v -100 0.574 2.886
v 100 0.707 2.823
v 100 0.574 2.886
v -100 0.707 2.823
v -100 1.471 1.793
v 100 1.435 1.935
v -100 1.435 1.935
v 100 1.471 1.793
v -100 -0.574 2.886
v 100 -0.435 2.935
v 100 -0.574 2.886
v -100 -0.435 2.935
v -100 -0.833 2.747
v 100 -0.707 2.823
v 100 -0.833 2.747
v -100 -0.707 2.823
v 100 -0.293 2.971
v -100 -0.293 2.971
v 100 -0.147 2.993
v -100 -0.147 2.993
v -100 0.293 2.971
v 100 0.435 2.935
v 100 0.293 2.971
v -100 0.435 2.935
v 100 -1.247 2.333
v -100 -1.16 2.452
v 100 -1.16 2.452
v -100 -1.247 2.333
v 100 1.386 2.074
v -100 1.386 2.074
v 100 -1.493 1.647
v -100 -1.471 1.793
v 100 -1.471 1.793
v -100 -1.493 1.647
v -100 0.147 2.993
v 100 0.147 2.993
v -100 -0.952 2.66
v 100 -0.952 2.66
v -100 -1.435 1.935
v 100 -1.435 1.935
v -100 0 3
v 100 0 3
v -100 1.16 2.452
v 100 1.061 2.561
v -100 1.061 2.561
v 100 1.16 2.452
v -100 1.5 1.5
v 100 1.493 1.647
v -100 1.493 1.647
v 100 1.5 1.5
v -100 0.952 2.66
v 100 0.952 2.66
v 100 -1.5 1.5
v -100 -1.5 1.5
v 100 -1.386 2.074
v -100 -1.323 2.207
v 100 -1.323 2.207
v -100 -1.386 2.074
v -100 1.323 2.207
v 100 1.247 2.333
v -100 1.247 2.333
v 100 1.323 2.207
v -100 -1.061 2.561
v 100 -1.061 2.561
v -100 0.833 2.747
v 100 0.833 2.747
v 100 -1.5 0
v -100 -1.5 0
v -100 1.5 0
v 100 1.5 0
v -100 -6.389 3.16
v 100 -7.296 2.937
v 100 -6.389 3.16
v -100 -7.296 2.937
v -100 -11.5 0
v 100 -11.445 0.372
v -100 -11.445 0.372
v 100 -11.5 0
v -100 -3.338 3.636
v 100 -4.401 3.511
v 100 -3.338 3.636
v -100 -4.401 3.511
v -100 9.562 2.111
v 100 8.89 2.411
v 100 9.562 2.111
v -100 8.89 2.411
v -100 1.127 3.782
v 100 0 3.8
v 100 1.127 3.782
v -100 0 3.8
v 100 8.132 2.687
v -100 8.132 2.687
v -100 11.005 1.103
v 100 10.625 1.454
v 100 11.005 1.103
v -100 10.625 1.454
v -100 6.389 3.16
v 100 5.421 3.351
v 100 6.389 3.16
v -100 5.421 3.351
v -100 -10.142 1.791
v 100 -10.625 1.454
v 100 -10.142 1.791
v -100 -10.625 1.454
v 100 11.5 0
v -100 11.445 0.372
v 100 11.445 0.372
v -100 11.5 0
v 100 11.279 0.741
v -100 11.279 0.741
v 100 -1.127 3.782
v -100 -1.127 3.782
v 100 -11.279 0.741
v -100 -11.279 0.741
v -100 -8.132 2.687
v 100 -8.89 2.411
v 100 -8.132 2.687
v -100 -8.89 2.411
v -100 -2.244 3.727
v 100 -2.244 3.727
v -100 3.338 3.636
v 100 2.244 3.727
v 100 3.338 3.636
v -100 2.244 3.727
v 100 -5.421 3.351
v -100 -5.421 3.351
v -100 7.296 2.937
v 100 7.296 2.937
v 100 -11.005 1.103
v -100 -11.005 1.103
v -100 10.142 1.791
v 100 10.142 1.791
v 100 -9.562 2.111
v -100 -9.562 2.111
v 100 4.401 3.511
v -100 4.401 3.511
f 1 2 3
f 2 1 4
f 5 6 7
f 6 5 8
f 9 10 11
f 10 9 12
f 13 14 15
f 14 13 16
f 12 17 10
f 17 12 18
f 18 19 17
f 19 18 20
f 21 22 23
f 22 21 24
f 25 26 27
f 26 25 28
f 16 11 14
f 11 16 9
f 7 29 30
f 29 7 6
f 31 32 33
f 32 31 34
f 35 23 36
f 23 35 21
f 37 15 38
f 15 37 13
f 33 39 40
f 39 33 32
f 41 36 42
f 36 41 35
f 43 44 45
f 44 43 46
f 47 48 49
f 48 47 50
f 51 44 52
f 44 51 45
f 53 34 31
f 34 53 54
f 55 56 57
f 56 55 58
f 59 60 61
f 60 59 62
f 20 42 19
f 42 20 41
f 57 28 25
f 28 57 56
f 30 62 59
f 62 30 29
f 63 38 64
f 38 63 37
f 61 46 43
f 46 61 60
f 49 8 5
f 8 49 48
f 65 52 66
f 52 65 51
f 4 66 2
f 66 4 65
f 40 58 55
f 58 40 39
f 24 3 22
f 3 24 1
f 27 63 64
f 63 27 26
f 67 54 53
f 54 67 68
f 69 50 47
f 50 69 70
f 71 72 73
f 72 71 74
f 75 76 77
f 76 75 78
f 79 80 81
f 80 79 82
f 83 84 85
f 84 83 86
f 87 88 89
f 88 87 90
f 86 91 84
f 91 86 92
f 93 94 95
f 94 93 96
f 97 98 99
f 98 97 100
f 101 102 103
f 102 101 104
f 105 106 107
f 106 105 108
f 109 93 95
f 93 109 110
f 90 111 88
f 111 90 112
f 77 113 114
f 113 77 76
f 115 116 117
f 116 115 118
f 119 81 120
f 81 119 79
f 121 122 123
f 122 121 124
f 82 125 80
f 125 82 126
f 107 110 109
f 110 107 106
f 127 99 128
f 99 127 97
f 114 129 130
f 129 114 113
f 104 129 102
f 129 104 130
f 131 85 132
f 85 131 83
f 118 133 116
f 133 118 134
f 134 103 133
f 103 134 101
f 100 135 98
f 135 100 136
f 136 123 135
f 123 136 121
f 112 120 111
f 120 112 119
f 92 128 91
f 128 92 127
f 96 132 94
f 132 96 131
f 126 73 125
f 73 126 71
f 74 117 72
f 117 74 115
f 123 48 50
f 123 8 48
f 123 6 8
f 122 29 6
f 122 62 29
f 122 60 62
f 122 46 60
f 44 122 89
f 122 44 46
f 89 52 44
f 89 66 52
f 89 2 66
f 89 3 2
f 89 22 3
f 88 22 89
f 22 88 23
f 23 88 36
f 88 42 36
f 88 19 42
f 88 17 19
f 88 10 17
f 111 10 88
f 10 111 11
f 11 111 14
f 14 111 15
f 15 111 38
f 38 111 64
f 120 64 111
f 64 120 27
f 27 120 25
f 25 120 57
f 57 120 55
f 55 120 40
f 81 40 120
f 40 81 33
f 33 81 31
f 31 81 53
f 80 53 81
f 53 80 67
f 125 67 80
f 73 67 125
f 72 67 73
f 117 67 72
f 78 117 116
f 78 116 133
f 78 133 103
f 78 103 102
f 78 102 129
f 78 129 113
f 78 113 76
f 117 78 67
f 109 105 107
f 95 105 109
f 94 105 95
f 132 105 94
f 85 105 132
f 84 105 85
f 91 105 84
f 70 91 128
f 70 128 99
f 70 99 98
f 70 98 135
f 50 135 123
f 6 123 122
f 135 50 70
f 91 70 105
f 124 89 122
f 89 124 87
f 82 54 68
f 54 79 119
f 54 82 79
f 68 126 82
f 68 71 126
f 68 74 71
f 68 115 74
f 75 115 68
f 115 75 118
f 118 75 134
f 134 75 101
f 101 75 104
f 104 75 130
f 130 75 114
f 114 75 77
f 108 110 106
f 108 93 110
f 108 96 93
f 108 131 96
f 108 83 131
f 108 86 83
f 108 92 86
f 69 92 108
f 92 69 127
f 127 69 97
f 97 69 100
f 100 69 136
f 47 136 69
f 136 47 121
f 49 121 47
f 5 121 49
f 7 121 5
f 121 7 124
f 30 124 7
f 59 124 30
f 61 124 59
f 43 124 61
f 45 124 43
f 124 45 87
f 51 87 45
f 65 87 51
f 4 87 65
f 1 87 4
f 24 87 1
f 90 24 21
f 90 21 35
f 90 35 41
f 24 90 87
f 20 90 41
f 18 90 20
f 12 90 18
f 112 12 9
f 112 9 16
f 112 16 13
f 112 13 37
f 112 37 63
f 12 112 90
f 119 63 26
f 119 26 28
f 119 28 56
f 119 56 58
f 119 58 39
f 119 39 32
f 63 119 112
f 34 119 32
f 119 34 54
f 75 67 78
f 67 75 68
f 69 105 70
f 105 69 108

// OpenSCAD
$fn = $preview ? 16 : 64;

// diameter of cable (plus slack)
cable_diameter = 3;
// distance between cable and top of profile
fill = 0.8;
// width of transition profile
width = 23;
// length of transition profile
length = 200;

module __hidden__ () {}

height = cable_diameter + fill;

eps = 0.1;
eps2 = 0.2;

rotate([-90, 0, 0])
rotate([0, 90, 0])
difference() {
    linear_extrude(length, center = true)
        scale([width / 2, height, 1])
            circle(r = 1);
    translate([-0.5 * width - eps, 0, -0.5 * length - eps])
        cube([width + eps2, height, length + eps2]);
    
    union() {
        translate([0, -0.5 * cable_diameter, 0])
            cylinder(length + eps2, d = cable_diameter, center = true);
        cube([cable_diameter, cable_diameter, length + eps2], center =true);
    }
}
